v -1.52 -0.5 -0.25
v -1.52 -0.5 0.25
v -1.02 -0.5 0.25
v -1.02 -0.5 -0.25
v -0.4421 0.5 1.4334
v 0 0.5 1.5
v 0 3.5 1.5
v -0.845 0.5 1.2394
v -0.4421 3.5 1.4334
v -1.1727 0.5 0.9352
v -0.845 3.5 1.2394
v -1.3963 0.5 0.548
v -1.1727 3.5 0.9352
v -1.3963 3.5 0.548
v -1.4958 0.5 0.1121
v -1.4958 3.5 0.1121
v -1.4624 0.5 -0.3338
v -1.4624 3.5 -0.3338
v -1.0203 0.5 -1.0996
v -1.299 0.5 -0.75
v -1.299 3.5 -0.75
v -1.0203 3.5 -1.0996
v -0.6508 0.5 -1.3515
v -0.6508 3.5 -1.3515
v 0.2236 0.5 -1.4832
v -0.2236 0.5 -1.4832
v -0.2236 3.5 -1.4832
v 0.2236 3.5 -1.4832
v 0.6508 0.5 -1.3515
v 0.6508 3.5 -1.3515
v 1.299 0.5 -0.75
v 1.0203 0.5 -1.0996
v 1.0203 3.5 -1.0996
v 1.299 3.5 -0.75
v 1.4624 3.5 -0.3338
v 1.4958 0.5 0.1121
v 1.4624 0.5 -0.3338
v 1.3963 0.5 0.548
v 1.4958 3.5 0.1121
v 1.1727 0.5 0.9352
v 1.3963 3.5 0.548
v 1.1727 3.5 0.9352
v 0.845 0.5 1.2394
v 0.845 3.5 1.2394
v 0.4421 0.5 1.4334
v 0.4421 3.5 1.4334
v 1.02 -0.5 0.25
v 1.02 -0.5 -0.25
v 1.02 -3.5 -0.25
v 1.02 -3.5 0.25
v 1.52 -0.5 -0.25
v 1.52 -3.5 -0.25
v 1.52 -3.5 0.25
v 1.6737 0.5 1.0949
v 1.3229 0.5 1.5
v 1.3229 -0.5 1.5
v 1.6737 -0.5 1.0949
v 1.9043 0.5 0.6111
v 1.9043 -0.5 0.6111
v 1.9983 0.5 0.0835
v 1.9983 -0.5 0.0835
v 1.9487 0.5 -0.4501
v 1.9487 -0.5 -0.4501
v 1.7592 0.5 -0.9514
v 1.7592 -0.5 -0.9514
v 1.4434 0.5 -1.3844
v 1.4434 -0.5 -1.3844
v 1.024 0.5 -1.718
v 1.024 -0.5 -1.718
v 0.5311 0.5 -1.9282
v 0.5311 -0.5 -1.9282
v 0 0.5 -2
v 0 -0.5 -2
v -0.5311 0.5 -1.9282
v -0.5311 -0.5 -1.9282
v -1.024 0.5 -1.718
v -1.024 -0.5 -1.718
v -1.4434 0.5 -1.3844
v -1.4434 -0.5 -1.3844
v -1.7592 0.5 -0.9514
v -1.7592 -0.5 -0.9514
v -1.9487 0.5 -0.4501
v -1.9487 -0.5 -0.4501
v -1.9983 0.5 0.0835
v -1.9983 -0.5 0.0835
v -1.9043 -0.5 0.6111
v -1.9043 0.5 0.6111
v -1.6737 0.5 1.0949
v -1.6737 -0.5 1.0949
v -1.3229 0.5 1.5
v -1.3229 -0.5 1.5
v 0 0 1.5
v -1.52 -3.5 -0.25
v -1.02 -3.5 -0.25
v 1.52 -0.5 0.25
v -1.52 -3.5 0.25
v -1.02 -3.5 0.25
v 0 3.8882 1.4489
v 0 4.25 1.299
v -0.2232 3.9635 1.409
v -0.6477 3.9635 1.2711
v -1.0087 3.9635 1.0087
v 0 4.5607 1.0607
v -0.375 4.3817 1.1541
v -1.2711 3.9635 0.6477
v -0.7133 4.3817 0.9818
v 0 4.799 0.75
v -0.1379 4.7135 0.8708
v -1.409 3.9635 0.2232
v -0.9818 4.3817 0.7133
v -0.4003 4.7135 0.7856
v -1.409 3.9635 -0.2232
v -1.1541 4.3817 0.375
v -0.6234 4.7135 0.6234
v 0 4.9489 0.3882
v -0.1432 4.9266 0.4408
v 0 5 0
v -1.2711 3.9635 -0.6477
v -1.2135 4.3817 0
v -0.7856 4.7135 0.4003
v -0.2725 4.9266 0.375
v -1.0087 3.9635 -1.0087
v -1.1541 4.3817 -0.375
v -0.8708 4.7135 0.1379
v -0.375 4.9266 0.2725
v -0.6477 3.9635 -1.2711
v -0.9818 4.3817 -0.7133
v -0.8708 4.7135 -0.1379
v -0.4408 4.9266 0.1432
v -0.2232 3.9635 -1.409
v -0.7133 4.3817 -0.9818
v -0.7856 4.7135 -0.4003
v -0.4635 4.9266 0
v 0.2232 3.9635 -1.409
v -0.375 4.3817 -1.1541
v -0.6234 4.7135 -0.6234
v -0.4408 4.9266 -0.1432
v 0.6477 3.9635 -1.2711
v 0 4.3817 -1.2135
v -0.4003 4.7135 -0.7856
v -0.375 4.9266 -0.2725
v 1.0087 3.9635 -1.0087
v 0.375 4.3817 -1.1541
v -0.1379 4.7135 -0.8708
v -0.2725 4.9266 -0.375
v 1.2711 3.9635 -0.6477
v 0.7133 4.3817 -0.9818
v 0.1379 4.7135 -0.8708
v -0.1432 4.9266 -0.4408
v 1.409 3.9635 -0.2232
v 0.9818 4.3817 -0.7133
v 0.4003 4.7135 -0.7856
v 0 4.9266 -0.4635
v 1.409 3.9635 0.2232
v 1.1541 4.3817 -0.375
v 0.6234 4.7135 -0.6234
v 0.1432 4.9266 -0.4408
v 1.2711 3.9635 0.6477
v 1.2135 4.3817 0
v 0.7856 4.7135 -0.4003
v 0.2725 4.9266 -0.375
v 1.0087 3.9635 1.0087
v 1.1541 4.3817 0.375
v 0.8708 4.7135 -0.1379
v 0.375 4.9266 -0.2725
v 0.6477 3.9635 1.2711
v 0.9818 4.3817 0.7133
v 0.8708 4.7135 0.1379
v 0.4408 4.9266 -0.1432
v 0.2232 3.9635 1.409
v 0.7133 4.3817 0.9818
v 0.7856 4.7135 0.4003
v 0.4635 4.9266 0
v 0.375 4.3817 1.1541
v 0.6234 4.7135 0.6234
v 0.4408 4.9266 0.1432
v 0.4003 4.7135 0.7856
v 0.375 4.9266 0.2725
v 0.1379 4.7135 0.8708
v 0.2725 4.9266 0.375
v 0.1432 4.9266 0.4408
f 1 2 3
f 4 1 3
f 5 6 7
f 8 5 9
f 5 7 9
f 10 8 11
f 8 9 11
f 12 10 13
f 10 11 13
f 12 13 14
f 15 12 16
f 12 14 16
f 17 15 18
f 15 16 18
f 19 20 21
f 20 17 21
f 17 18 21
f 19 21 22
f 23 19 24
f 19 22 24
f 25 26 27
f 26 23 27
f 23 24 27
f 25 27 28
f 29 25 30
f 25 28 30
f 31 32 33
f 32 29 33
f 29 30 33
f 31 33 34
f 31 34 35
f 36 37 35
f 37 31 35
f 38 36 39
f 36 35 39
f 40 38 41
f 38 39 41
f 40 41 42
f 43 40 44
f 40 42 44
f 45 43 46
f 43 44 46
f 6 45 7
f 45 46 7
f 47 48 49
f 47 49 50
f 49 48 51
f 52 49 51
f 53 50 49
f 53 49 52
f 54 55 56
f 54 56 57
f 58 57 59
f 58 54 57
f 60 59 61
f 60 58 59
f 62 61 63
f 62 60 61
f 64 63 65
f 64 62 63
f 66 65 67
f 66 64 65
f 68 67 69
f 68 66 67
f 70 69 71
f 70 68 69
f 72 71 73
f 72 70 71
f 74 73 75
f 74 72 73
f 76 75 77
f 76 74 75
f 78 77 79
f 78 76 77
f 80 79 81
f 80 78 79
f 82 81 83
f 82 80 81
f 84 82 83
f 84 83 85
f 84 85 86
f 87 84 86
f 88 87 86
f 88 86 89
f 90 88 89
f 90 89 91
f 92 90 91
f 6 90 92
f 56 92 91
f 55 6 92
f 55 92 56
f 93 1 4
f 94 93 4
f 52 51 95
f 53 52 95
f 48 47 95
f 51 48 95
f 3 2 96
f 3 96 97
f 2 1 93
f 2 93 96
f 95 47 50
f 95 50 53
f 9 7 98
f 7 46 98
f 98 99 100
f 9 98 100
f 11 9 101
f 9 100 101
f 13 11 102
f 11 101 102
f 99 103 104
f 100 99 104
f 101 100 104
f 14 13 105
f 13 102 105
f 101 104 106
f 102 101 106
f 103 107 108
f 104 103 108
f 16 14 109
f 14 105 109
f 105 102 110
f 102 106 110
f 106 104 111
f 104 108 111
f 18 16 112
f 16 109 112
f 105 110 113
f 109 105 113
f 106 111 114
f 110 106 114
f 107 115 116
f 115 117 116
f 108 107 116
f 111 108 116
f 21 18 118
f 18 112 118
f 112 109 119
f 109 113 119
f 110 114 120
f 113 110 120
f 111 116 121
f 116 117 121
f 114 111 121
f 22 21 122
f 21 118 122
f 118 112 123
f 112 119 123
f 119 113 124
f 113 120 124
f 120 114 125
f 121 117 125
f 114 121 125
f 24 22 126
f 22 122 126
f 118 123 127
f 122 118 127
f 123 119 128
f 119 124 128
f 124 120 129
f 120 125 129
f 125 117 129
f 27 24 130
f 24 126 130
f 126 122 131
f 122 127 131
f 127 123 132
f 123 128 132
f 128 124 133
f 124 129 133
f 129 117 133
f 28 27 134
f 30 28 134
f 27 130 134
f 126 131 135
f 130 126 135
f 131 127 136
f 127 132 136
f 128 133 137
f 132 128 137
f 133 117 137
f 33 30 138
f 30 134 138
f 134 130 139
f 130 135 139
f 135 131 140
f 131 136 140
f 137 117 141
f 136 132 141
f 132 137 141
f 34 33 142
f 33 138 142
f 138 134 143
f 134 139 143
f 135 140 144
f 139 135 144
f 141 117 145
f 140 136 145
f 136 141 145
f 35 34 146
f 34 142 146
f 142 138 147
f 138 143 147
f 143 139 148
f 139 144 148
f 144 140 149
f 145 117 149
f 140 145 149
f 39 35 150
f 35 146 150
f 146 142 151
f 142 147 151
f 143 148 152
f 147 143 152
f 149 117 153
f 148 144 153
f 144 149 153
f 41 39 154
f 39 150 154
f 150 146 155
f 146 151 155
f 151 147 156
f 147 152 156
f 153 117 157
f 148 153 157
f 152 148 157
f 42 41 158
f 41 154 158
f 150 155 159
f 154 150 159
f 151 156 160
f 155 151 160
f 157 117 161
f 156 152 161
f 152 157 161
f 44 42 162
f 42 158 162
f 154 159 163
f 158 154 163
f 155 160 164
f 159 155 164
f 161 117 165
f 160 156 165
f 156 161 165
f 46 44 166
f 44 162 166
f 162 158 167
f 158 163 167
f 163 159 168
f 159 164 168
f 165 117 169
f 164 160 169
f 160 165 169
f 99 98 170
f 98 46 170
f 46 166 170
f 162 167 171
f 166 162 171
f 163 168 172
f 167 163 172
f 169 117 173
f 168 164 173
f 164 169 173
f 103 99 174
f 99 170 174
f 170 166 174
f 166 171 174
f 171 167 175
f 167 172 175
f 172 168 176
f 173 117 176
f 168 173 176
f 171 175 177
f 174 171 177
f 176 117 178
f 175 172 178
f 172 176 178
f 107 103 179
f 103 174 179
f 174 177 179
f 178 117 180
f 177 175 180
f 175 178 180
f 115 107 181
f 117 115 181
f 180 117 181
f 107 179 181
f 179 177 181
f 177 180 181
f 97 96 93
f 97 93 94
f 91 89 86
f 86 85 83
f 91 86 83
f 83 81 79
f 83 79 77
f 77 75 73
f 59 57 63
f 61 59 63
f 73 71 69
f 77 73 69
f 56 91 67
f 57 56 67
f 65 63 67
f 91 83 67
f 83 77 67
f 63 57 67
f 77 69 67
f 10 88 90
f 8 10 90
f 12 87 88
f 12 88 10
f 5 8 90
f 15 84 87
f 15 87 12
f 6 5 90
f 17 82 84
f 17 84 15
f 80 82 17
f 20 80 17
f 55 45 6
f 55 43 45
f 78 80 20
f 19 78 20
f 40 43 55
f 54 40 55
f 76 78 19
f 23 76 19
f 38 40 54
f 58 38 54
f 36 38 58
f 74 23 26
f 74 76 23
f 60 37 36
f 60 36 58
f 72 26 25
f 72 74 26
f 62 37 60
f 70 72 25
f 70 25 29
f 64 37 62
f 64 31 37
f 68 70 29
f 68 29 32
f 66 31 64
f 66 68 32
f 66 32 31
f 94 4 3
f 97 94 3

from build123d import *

# Parameters (mm, degrees)
BOSS_EXTRUDE1_DEPTH   = 0.5
SKETCH3_W             = 0.5
SKETCH3_H             = 0.5
BOSS_EXTRUDE2_DEPTH   = 3
BOSS_EXTRUDE2_2_DEPTH = 3


with BuildPart() as part:
    # Sketch1 → Revolve1 (revolve)
    with BuildSketch(Plane(origin=(0, 0, 0), x_dir=(0, 0, -1), z_dir=(1, 0, 0))):
        with BuildLine():
            Line((-1.5, 0), (-1.5, 3.5))
            ThreePointArc((-1.5, 3.5), (-1.060660172, 4.560660172), (0, 5))
            Line((0, 5), (0, 0))
            Line((0, 0), (-1.5, 0))
        make_face()
    revolve(axis=Axis((0, 5, 0), (0, -1, 0)))

    # Sketch2 → Boss-Extrude1 (add, symmetric)
    with BuildSketch(Plane(origin=(0, 0, 0), x_dir=(1, 0, 0), z_dir=(0, 1, 0))):
        with BuildLine():
            Line((-1.322875656, -1.5), (1.322875656, -1.5))
            ThreePointArc((1.322875656, -1.5), (0, 2), (-1.322875656, -1.5))
        make_face()
    extrude(amount=BOSS_EXTRUDE1_DEPTH, both=True)


with BuildPart() as body_2:
    # Sketch3 → Boss-Extrude2 (new body)
    with BuildSketch(Plane.XZ.offset(0.5)):
        with Locations((-1.27, 0)):
            Rectangle(SKETCH3_W, SKETCH3_H)
    extrude(amount=BOSS_EXTRUDE2_DEPTH)


with BuildPart() as body_3:
    # Sketch3 → Boss-Extrude2 2 (new body)
    with BuildSketch(Plane.XZ.offset(0.5)):
        with Locations((1.27, 0)):
            Rectangle(SKETCH3_W, SKETCH3_H)
    extrude(amount=BOSS_EXTRUDE2_2_DEPTH)


solid = Compound([part.part, body_2.part, body_3.part])
